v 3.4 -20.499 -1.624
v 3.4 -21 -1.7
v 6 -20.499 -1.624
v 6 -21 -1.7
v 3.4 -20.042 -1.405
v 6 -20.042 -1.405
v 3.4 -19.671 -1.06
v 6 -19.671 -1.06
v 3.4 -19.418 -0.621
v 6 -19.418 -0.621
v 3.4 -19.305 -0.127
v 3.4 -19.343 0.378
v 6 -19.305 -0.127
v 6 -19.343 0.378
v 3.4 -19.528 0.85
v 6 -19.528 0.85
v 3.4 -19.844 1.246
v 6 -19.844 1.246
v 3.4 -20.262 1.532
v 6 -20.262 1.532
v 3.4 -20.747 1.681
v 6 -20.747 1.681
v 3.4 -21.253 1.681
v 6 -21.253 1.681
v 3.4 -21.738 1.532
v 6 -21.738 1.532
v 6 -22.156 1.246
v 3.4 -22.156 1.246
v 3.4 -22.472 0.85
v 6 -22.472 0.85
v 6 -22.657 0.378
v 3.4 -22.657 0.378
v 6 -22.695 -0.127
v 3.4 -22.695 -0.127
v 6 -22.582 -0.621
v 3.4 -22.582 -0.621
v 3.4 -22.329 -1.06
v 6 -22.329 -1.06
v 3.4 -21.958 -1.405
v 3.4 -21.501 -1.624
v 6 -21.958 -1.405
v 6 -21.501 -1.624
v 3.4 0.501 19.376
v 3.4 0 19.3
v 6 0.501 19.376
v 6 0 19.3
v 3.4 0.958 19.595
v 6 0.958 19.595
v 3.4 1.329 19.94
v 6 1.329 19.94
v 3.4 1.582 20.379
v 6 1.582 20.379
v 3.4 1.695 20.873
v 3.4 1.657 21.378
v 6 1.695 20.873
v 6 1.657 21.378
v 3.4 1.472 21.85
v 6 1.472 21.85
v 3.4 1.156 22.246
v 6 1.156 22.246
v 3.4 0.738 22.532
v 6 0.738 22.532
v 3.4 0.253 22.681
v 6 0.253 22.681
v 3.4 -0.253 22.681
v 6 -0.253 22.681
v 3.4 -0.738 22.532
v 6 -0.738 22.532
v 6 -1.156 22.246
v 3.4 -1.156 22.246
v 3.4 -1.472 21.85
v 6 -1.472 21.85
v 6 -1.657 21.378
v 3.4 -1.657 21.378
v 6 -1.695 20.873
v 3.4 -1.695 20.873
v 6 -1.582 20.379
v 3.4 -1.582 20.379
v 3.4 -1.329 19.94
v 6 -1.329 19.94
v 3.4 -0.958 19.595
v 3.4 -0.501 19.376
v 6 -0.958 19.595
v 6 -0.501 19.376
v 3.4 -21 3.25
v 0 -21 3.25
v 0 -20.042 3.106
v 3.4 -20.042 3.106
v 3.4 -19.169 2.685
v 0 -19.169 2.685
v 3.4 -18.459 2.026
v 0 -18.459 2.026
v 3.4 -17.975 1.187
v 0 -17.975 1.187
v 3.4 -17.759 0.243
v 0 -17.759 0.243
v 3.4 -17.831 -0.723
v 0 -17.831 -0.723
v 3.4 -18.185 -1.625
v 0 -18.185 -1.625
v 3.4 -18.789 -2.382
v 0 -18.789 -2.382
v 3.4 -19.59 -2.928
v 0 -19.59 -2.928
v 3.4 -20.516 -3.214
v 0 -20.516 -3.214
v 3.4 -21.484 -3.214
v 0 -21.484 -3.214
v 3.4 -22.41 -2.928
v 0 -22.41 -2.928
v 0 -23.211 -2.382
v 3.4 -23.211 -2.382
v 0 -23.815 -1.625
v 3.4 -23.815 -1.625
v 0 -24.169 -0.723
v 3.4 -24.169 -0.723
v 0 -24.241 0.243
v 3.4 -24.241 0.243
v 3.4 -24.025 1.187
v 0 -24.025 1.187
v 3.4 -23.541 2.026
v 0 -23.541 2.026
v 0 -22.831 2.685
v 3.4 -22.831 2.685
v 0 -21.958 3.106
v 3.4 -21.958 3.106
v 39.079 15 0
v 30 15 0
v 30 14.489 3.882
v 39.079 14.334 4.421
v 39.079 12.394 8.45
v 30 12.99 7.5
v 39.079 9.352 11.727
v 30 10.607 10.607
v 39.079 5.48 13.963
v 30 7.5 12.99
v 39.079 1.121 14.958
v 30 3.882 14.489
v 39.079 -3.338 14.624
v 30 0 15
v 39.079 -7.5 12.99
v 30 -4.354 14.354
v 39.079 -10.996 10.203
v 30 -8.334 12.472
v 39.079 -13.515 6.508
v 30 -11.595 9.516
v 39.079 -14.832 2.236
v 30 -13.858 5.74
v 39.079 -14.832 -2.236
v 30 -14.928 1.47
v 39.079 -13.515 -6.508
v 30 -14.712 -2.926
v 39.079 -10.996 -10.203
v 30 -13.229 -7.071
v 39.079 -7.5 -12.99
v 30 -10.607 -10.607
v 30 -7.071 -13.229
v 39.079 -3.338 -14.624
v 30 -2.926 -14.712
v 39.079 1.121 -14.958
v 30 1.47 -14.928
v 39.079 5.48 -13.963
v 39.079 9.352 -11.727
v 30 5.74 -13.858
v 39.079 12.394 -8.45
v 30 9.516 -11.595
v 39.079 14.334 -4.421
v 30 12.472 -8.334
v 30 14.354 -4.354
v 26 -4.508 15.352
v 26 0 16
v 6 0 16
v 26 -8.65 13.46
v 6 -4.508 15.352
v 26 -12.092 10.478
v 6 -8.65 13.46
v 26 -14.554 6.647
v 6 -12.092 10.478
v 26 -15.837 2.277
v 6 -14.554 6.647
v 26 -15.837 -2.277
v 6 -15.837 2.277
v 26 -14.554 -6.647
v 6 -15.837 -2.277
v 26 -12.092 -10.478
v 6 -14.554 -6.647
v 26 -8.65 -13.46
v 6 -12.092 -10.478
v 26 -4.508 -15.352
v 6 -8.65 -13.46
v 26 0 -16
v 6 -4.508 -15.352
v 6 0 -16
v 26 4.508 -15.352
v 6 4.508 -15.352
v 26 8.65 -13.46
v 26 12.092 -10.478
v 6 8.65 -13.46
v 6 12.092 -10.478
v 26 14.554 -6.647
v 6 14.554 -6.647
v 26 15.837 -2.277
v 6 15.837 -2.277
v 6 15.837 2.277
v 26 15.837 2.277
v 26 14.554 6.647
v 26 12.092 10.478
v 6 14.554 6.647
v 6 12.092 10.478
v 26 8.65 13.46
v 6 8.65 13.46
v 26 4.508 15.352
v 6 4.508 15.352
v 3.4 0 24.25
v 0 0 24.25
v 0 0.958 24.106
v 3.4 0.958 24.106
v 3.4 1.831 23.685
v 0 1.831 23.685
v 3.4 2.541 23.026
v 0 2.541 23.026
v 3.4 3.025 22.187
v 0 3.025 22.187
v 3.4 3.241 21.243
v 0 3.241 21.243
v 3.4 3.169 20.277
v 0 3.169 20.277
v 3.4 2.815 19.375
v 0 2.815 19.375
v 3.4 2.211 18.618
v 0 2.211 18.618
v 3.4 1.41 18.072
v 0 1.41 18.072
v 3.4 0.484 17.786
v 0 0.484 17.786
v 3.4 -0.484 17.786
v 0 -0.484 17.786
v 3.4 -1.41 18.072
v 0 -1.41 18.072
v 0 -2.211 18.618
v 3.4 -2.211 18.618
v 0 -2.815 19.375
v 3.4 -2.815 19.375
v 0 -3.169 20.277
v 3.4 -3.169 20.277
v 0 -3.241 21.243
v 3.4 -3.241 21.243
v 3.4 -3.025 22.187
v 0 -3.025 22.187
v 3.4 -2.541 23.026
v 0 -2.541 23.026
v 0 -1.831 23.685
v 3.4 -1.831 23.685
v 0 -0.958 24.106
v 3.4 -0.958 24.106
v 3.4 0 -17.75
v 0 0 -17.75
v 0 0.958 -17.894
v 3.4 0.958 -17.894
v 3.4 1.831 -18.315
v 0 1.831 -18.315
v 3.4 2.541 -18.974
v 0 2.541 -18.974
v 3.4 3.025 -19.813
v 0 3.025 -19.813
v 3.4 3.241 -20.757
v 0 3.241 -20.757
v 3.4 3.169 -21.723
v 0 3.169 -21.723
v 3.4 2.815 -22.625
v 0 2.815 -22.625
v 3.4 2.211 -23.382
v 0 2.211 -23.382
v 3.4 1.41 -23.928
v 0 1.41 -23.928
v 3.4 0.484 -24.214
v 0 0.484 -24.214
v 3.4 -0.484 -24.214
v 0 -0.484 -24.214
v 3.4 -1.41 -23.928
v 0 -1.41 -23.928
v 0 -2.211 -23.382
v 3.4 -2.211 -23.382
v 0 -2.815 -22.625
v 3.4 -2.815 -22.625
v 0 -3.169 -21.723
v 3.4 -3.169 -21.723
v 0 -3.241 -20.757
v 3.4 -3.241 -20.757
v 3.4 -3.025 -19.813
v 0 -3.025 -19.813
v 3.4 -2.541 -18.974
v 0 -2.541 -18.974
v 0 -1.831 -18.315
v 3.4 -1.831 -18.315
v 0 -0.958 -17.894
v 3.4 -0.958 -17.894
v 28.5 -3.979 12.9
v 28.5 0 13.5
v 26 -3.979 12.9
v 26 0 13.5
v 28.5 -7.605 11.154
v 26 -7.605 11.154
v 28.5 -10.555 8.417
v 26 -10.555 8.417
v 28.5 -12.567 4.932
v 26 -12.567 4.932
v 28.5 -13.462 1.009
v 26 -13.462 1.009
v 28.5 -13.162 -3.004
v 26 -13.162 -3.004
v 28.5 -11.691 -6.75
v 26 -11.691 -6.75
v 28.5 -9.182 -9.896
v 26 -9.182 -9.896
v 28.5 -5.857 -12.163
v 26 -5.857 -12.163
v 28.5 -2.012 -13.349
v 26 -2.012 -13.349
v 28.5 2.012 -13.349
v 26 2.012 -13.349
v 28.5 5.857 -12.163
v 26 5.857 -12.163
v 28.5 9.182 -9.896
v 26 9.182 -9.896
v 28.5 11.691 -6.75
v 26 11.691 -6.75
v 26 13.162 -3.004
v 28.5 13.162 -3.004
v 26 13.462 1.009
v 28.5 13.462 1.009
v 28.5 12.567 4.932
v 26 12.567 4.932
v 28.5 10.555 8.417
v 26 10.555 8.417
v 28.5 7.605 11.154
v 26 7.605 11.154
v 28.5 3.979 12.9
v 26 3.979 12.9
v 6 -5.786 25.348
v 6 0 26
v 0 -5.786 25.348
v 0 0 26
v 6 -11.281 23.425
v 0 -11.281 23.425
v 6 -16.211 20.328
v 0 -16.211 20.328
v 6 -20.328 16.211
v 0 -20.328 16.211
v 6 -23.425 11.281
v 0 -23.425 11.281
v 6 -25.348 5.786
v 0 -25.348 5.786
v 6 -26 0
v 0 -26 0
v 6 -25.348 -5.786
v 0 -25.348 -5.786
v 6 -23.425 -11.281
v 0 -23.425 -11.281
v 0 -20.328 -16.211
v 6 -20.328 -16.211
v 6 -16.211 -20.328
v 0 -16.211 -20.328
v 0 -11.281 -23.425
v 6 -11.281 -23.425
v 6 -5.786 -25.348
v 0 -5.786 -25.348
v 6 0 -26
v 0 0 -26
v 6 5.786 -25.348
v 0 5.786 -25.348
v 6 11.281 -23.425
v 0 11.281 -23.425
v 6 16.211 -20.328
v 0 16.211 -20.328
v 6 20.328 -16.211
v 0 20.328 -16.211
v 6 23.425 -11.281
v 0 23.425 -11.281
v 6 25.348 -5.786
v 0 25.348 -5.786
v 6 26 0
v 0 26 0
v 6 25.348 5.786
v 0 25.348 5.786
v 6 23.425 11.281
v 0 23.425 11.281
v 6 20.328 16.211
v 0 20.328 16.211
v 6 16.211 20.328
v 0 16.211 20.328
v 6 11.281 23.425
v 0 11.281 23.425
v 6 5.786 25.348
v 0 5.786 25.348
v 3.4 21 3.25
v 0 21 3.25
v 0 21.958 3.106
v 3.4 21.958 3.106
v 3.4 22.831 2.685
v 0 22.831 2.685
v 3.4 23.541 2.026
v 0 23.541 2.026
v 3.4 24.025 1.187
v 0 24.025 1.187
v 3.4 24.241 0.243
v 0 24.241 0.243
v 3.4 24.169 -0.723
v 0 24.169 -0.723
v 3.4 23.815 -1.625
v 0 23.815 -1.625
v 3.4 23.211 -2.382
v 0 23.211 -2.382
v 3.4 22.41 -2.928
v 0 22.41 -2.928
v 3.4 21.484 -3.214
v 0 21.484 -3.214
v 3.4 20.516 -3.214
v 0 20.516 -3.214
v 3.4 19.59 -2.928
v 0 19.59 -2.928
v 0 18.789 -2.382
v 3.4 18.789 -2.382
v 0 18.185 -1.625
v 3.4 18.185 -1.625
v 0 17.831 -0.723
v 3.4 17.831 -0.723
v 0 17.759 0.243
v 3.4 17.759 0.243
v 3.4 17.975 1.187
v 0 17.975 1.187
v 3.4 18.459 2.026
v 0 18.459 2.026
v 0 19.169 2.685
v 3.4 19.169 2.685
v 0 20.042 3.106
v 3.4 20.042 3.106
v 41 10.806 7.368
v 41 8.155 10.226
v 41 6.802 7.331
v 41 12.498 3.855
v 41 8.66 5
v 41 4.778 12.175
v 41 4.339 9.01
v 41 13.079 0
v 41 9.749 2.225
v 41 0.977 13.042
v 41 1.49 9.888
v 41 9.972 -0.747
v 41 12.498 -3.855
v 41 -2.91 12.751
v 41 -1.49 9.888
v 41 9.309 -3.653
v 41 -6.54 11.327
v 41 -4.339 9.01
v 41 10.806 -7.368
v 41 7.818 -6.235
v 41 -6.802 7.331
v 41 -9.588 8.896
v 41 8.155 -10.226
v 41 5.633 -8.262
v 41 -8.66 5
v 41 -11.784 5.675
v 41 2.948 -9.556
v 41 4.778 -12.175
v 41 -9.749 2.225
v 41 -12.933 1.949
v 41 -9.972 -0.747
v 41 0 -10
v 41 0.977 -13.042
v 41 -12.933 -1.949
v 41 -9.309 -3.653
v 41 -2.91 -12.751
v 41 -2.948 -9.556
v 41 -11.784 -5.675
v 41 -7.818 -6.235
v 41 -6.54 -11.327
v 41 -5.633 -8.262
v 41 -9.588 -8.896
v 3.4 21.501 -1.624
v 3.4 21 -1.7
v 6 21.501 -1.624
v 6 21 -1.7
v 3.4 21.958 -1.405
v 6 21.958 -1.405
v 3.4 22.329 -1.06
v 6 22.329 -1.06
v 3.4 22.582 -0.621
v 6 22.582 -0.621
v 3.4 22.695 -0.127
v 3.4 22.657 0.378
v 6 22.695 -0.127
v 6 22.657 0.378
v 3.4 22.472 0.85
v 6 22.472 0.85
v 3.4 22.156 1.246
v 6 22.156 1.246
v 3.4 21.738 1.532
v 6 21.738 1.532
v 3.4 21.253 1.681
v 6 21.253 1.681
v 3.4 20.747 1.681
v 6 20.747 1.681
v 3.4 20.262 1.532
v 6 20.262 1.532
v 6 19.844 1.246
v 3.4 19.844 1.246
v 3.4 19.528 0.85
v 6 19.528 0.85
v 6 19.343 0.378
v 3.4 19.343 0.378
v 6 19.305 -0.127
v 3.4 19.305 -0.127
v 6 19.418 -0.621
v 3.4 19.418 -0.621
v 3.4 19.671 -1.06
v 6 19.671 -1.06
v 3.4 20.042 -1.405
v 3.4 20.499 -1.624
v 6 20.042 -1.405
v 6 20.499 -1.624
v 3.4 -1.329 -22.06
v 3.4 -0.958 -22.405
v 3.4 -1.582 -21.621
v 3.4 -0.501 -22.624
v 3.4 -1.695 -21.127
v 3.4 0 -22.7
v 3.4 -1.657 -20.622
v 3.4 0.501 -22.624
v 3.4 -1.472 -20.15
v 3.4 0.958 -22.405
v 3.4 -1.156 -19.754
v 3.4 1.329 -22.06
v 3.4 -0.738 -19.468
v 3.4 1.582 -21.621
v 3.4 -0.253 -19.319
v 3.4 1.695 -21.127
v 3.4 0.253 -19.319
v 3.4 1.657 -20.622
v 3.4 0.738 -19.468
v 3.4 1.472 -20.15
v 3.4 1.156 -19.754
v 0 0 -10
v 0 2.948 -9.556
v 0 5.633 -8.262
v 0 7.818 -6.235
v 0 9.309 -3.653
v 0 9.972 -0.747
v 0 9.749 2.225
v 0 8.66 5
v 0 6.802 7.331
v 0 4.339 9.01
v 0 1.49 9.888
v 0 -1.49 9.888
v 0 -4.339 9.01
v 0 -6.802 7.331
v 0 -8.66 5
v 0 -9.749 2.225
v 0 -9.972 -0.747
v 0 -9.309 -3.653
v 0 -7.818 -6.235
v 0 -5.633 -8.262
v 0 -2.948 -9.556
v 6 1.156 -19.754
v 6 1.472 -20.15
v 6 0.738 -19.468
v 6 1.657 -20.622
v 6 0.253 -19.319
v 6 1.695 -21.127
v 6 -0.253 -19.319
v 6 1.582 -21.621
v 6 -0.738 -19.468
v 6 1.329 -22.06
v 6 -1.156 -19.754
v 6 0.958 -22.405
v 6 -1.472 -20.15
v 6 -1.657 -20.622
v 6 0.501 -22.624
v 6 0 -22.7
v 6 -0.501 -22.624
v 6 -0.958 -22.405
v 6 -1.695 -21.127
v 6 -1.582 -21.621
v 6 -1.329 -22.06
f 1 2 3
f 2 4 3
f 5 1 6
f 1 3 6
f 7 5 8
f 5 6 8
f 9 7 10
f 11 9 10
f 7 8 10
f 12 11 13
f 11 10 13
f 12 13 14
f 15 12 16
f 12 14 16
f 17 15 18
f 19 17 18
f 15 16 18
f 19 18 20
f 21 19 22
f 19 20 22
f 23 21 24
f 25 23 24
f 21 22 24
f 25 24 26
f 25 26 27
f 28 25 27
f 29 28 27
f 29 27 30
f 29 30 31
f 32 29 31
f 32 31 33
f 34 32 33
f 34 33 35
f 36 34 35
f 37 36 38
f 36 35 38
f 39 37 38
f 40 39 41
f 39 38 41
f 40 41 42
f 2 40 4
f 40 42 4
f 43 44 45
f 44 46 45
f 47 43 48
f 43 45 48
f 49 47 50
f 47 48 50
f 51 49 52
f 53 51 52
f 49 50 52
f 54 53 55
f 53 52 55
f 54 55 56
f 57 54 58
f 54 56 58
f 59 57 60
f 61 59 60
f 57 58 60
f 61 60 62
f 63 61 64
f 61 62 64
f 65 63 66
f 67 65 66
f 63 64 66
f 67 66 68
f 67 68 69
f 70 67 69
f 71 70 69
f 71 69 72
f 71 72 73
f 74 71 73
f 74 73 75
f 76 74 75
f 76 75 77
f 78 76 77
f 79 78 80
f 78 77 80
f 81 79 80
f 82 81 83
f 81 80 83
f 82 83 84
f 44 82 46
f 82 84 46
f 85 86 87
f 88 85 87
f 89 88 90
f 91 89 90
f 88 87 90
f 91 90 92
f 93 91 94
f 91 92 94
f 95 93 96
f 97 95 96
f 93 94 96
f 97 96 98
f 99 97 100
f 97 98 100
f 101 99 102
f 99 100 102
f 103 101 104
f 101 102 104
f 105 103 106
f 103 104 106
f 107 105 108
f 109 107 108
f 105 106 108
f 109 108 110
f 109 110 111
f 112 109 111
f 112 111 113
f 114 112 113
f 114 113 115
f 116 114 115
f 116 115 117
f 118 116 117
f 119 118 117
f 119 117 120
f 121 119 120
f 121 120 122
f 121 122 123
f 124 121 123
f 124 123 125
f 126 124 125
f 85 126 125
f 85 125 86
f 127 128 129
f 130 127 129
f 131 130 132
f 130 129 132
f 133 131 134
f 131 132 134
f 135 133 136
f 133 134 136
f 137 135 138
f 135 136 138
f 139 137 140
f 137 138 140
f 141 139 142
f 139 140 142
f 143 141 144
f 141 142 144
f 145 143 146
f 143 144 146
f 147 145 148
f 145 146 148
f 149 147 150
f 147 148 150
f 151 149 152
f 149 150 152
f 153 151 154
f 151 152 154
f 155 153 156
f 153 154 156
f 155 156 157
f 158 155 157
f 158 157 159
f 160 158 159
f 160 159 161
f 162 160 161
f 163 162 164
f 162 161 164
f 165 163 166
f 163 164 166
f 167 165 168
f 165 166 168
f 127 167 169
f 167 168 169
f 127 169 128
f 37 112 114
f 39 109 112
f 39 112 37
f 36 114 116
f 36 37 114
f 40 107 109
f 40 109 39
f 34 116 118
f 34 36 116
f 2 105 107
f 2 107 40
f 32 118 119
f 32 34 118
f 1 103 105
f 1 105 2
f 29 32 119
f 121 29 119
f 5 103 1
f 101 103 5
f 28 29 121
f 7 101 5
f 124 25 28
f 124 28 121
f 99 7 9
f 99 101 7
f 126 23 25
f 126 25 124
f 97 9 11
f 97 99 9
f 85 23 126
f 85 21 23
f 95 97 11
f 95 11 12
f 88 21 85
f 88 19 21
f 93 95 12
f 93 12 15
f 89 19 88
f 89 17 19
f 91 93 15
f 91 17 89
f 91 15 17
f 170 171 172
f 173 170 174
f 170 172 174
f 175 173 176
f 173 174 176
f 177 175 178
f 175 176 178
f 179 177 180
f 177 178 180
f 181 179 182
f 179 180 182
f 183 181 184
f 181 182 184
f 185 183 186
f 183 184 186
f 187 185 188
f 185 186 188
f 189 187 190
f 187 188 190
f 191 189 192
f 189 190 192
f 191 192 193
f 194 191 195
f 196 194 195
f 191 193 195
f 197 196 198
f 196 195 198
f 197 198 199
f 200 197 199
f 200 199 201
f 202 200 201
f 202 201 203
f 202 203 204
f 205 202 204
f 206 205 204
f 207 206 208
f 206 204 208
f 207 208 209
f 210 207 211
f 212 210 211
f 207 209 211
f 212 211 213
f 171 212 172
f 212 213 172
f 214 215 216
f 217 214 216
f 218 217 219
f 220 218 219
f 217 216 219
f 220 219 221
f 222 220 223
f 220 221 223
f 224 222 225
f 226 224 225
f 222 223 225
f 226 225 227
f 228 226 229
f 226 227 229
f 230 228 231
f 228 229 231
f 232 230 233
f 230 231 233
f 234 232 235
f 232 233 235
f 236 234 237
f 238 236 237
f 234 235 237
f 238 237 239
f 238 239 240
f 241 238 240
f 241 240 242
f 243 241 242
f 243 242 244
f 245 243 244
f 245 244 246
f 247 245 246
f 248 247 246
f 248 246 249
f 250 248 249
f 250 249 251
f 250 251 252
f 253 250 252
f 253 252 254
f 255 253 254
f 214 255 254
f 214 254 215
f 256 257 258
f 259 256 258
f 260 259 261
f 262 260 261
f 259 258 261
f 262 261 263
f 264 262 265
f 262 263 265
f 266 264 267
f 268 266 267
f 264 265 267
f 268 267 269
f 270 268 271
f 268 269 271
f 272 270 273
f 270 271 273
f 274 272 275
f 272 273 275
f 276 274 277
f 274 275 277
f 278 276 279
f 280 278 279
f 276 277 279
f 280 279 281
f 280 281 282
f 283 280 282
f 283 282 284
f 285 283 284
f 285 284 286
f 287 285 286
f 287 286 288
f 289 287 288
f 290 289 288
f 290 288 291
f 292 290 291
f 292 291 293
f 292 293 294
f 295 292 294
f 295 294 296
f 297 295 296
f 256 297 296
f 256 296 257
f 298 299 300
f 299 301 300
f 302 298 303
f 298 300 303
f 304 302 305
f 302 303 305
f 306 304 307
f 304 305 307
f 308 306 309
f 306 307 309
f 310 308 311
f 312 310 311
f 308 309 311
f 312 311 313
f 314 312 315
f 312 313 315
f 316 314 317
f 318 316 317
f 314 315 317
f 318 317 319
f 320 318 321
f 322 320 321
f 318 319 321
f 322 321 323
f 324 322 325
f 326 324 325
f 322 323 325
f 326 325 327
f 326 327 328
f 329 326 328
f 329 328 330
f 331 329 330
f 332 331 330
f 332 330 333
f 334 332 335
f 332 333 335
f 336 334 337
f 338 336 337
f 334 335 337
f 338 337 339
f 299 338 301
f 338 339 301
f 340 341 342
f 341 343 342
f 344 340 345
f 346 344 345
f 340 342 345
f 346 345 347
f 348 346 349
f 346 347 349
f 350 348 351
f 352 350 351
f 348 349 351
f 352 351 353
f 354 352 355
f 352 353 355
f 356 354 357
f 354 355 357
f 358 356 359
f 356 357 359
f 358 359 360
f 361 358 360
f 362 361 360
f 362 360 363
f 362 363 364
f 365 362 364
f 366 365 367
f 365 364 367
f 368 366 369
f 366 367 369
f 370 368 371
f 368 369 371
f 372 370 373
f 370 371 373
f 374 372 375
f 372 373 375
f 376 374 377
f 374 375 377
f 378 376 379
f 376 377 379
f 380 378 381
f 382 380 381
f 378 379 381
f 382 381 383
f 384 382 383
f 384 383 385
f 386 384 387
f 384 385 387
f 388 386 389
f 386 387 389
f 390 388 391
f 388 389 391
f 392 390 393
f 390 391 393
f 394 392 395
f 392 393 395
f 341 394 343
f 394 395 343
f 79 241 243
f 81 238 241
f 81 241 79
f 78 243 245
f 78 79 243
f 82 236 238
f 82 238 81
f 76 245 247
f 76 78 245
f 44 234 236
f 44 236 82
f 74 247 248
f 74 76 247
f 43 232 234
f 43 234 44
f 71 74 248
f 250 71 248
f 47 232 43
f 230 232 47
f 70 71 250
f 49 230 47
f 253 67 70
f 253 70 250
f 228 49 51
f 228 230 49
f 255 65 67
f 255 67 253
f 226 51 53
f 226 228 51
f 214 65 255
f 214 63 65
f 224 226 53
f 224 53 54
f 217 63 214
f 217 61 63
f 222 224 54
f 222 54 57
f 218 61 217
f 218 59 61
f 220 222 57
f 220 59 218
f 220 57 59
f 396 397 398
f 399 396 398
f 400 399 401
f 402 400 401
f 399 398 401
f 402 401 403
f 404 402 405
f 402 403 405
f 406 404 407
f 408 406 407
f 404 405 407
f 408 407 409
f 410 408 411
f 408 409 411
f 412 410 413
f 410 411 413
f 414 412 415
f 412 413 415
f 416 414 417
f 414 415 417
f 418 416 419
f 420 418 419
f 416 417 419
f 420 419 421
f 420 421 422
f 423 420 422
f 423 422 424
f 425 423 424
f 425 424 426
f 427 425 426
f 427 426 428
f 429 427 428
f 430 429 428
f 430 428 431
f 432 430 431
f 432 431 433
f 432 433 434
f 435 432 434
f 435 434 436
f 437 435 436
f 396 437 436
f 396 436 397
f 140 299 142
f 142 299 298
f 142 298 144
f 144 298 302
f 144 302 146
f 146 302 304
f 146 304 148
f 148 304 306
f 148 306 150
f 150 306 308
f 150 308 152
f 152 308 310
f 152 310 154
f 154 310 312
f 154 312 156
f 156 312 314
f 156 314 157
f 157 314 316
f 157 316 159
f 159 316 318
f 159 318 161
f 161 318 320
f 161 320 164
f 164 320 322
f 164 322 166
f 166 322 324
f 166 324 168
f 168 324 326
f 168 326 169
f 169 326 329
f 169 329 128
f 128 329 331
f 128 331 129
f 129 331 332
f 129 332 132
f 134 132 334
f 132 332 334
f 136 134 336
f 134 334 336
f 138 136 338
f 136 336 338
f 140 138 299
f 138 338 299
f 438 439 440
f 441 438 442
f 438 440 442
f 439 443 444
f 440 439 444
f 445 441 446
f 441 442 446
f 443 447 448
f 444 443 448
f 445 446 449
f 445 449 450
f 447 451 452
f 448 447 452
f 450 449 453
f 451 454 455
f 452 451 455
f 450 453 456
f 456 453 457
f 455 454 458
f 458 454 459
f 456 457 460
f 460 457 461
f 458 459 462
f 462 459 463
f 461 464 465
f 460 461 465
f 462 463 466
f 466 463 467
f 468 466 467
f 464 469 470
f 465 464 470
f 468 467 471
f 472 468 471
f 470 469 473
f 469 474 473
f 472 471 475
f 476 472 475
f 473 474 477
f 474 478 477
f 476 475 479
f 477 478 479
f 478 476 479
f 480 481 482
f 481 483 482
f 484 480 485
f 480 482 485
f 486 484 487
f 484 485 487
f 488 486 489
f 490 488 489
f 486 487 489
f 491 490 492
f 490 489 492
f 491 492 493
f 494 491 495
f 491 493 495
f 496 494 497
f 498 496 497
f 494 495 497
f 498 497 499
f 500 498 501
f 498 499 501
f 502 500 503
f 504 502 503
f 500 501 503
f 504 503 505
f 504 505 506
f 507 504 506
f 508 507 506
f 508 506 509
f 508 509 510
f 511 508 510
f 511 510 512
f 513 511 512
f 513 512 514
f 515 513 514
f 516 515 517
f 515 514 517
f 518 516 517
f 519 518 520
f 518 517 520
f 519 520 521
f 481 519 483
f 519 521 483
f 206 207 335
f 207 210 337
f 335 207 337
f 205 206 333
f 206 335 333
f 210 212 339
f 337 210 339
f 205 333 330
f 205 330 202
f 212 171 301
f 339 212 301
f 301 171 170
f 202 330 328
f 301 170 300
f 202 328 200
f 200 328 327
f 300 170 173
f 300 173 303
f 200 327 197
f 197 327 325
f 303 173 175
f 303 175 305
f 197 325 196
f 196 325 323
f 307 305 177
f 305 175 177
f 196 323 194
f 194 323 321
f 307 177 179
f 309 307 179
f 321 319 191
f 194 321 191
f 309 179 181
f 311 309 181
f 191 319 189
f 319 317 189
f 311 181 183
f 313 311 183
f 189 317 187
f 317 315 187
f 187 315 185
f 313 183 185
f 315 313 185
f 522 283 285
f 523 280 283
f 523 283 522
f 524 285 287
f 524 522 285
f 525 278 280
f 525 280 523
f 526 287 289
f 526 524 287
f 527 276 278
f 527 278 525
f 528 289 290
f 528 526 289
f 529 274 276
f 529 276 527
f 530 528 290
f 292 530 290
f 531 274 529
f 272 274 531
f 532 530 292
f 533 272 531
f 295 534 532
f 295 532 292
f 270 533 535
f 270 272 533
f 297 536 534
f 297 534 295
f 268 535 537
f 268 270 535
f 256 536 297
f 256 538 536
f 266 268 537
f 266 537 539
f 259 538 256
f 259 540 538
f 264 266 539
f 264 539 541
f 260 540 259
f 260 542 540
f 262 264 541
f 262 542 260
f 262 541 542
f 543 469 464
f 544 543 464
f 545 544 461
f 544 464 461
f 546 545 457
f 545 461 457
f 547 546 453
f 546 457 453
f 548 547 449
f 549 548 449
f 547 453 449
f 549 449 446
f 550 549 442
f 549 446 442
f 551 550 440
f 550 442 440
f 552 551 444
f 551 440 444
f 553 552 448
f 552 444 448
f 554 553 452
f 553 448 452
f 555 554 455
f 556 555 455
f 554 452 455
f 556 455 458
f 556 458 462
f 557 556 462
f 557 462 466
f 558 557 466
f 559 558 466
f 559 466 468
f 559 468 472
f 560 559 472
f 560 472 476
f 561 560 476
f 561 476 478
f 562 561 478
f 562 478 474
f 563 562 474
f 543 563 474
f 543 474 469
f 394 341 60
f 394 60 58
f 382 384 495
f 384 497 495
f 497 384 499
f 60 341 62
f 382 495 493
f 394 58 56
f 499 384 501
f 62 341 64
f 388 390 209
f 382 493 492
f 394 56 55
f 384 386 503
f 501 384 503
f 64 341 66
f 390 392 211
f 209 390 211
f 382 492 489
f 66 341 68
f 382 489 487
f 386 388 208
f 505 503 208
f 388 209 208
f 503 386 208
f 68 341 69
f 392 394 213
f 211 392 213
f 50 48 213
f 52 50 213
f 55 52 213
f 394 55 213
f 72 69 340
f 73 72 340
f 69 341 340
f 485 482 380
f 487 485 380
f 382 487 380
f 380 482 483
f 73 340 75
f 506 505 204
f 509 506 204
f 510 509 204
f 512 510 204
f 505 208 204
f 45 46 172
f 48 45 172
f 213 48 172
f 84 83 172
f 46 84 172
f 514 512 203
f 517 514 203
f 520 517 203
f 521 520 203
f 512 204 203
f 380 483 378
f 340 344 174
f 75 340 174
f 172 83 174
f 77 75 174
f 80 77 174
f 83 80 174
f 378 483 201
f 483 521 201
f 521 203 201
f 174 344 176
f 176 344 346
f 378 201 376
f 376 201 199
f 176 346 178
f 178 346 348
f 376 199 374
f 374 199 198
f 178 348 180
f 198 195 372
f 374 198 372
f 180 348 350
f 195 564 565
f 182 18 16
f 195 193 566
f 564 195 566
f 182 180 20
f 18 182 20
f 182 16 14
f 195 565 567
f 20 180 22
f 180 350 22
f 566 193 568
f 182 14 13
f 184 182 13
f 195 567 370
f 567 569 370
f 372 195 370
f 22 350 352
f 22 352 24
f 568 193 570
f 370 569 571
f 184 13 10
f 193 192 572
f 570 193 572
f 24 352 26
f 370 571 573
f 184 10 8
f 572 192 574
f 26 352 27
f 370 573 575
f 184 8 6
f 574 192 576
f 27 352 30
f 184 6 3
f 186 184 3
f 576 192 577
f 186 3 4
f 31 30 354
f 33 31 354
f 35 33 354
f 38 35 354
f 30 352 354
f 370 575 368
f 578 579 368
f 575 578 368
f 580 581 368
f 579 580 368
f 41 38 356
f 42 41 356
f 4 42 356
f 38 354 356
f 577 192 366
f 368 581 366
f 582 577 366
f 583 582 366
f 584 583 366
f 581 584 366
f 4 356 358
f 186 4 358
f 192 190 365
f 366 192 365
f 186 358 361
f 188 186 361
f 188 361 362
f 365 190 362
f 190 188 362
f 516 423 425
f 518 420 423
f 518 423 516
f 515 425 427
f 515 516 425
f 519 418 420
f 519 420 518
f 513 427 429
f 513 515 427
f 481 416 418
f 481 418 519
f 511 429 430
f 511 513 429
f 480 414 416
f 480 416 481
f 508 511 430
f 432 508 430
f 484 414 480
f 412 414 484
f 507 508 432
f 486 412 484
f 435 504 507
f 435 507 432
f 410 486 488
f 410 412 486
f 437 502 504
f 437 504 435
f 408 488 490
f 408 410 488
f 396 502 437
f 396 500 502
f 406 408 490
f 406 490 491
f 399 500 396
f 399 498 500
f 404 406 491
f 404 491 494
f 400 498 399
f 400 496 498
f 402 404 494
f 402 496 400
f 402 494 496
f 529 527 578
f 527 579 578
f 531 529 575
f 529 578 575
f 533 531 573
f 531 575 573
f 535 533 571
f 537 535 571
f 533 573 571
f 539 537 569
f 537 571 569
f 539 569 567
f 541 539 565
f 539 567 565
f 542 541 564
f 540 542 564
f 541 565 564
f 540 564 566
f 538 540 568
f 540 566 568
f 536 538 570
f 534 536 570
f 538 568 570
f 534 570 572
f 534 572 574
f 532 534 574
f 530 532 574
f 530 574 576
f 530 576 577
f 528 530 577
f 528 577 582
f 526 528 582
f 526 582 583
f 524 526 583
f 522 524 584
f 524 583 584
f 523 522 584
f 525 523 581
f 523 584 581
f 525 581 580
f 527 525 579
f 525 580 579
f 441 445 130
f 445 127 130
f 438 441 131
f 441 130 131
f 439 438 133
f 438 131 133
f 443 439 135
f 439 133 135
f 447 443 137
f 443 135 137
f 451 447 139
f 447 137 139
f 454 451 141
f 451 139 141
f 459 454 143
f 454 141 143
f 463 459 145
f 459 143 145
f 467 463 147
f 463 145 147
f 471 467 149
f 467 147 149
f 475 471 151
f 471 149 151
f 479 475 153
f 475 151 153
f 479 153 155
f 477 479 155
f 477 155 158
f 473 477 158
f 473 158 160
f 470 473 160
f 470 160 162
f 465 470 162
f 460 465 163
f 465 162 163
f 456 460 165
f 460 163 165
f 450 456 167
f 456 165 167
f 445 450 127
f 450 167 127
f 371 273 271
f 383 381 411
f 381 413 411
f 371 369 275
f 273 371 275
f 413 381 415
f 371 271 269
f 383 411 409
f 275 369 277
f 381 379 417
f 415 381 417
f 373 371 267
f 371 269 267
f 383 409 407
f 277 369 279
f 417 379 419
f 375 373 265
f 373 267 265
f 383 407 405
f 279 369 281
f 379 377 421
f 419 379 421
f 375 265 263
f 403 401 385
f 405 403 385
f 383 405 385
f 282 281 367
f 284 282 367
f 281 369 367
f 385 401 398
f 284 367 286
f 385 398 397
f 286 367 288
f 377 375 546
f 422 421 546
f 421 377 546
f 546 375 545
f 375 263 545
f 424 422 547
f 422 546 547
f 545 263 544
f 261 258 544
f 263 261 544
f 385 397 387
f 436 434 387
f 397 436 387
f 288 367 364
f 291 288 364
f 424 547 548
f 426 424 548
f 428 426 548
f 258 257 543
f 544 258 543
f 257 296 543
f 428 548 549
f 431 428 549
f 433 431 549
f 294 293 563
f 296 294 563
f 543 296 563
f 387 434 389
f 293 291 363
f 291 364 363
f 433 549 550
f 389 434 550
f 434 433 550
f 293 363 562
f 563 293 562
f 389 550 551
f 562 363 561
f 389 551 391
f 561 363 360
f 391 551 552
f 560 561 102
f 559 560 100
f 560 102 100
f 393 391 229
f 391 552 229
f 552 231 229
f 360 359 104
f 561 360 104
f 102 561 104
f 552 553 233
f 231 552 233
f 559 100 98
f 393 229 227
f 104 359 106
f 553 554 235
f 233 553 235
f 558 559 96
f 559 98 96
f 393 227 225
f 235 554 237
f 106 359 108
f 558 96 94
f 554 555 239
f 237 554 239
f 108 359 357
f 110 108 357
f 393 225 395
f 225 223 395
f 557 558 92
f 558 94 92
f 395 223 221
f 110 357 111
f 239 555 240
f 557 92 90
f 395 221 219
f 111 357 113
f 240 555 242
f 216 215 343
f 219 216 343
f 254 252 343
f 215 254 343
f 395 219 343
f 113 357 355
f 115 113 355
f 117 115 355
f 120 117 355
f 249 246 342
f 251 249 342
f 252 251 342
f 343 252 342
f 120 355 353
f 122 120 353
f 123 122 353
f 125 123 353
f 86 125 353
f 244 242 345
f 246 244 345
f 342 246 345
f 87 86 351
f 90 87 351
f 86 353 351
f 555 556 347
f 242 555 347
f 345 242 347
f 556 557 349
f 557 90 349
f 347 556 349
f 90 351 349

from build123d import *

# Parameters (mm, degrees)
CBORE_FOR_M3_HEX_SOCKET_HEAD_CAP_SCREW1_D           = 3.4
CBORE_FOR_M3_HEX_SOCKET_HEAD_CAP_SCREW1_CBORE_D     = 6.5
CBORE_FOR_M3_HEX_SOCKET_HEAD_CAP_SCREW1_CBORE_DEPTH = 3.4
F_20_0MM_DOWEL_HOLE1_D                              = 20


# Read off the part's stored shape, not the designer's step: M30 Machine Threads Stud1
with BuildPart() as part:
    # Sketch1 → Revolve1 (revolve)
    with BuildSketch(Plane.XY, mode=Mode.PRIVATE) as revolve1_sk:
        Polygon((0, 0), (41, 0), (41, 16), (6, 16), (6, 26), (0, 26), align=None)
    revolve(revolve1_sk.sketch.rotate(Axis((0, 0, 0), (1, 0, 0)), 90), axis=Axis((0, 0, 0), (1, 0, 0)))

    # M30 Machine Threads Stud1 outline → M30 Machine Threads Stud1 (revolve, cut)
    with BuildSketch(Plane.YX):
        Polygon((16, 41), (13.079, 41), (15, 39.079), (15, 26), (16, 26), align=None)
    revolve(axis=Axis((0, 0, 0), (1, 0, 0)), mode=Mode.SUBTRACT)

    # CBORE for M3 Hex Socket Head Cap Screw1 (through all)
    with Locations(Plane.ZY):
        with Locations((-21, 0), (0, 21), (21, 0), (0, -21)):
            CounterBoreHole(CBORE_FOR_M3_HEX_SOCKET_HEAD_CAP_SCREW1_D / 2, CBORE_FOR_M3_HEX_SOCKET_HEAD_CAP_SCREW1_CBORE_D / 2, CBORE_FOR_M3_HEX_SOCKET_HEAD_CAP_SCREW1_CBORE_DEPTH)

    # Ø20.0mm Dowel Hole1 (through all)
    with Locations(Plane.ZY):
        with Locations((0, 0)):
            Hole(F_20_0MM_DOWEL_HOLE1_D / 2)

    # Sketch9 → Cut-Revolve1 (revolve, cut)
    with BuildSketch(Plane.XY, mode=Mode.PRIVATE) as cut_revolve1_sk:
        Polygon((30, 15), (28.5, 13.5), (26, 13.5), (26, 15), align=None)
    revolve(cut_revolve1_sk.sketch.rotate(Axis((0, 0, 0), (1, 0, 0)), 90), axis=Axis((0, 0, 0), (1, 0, 0)), mode=Mode.SUBTRACT)


solid = part.part
